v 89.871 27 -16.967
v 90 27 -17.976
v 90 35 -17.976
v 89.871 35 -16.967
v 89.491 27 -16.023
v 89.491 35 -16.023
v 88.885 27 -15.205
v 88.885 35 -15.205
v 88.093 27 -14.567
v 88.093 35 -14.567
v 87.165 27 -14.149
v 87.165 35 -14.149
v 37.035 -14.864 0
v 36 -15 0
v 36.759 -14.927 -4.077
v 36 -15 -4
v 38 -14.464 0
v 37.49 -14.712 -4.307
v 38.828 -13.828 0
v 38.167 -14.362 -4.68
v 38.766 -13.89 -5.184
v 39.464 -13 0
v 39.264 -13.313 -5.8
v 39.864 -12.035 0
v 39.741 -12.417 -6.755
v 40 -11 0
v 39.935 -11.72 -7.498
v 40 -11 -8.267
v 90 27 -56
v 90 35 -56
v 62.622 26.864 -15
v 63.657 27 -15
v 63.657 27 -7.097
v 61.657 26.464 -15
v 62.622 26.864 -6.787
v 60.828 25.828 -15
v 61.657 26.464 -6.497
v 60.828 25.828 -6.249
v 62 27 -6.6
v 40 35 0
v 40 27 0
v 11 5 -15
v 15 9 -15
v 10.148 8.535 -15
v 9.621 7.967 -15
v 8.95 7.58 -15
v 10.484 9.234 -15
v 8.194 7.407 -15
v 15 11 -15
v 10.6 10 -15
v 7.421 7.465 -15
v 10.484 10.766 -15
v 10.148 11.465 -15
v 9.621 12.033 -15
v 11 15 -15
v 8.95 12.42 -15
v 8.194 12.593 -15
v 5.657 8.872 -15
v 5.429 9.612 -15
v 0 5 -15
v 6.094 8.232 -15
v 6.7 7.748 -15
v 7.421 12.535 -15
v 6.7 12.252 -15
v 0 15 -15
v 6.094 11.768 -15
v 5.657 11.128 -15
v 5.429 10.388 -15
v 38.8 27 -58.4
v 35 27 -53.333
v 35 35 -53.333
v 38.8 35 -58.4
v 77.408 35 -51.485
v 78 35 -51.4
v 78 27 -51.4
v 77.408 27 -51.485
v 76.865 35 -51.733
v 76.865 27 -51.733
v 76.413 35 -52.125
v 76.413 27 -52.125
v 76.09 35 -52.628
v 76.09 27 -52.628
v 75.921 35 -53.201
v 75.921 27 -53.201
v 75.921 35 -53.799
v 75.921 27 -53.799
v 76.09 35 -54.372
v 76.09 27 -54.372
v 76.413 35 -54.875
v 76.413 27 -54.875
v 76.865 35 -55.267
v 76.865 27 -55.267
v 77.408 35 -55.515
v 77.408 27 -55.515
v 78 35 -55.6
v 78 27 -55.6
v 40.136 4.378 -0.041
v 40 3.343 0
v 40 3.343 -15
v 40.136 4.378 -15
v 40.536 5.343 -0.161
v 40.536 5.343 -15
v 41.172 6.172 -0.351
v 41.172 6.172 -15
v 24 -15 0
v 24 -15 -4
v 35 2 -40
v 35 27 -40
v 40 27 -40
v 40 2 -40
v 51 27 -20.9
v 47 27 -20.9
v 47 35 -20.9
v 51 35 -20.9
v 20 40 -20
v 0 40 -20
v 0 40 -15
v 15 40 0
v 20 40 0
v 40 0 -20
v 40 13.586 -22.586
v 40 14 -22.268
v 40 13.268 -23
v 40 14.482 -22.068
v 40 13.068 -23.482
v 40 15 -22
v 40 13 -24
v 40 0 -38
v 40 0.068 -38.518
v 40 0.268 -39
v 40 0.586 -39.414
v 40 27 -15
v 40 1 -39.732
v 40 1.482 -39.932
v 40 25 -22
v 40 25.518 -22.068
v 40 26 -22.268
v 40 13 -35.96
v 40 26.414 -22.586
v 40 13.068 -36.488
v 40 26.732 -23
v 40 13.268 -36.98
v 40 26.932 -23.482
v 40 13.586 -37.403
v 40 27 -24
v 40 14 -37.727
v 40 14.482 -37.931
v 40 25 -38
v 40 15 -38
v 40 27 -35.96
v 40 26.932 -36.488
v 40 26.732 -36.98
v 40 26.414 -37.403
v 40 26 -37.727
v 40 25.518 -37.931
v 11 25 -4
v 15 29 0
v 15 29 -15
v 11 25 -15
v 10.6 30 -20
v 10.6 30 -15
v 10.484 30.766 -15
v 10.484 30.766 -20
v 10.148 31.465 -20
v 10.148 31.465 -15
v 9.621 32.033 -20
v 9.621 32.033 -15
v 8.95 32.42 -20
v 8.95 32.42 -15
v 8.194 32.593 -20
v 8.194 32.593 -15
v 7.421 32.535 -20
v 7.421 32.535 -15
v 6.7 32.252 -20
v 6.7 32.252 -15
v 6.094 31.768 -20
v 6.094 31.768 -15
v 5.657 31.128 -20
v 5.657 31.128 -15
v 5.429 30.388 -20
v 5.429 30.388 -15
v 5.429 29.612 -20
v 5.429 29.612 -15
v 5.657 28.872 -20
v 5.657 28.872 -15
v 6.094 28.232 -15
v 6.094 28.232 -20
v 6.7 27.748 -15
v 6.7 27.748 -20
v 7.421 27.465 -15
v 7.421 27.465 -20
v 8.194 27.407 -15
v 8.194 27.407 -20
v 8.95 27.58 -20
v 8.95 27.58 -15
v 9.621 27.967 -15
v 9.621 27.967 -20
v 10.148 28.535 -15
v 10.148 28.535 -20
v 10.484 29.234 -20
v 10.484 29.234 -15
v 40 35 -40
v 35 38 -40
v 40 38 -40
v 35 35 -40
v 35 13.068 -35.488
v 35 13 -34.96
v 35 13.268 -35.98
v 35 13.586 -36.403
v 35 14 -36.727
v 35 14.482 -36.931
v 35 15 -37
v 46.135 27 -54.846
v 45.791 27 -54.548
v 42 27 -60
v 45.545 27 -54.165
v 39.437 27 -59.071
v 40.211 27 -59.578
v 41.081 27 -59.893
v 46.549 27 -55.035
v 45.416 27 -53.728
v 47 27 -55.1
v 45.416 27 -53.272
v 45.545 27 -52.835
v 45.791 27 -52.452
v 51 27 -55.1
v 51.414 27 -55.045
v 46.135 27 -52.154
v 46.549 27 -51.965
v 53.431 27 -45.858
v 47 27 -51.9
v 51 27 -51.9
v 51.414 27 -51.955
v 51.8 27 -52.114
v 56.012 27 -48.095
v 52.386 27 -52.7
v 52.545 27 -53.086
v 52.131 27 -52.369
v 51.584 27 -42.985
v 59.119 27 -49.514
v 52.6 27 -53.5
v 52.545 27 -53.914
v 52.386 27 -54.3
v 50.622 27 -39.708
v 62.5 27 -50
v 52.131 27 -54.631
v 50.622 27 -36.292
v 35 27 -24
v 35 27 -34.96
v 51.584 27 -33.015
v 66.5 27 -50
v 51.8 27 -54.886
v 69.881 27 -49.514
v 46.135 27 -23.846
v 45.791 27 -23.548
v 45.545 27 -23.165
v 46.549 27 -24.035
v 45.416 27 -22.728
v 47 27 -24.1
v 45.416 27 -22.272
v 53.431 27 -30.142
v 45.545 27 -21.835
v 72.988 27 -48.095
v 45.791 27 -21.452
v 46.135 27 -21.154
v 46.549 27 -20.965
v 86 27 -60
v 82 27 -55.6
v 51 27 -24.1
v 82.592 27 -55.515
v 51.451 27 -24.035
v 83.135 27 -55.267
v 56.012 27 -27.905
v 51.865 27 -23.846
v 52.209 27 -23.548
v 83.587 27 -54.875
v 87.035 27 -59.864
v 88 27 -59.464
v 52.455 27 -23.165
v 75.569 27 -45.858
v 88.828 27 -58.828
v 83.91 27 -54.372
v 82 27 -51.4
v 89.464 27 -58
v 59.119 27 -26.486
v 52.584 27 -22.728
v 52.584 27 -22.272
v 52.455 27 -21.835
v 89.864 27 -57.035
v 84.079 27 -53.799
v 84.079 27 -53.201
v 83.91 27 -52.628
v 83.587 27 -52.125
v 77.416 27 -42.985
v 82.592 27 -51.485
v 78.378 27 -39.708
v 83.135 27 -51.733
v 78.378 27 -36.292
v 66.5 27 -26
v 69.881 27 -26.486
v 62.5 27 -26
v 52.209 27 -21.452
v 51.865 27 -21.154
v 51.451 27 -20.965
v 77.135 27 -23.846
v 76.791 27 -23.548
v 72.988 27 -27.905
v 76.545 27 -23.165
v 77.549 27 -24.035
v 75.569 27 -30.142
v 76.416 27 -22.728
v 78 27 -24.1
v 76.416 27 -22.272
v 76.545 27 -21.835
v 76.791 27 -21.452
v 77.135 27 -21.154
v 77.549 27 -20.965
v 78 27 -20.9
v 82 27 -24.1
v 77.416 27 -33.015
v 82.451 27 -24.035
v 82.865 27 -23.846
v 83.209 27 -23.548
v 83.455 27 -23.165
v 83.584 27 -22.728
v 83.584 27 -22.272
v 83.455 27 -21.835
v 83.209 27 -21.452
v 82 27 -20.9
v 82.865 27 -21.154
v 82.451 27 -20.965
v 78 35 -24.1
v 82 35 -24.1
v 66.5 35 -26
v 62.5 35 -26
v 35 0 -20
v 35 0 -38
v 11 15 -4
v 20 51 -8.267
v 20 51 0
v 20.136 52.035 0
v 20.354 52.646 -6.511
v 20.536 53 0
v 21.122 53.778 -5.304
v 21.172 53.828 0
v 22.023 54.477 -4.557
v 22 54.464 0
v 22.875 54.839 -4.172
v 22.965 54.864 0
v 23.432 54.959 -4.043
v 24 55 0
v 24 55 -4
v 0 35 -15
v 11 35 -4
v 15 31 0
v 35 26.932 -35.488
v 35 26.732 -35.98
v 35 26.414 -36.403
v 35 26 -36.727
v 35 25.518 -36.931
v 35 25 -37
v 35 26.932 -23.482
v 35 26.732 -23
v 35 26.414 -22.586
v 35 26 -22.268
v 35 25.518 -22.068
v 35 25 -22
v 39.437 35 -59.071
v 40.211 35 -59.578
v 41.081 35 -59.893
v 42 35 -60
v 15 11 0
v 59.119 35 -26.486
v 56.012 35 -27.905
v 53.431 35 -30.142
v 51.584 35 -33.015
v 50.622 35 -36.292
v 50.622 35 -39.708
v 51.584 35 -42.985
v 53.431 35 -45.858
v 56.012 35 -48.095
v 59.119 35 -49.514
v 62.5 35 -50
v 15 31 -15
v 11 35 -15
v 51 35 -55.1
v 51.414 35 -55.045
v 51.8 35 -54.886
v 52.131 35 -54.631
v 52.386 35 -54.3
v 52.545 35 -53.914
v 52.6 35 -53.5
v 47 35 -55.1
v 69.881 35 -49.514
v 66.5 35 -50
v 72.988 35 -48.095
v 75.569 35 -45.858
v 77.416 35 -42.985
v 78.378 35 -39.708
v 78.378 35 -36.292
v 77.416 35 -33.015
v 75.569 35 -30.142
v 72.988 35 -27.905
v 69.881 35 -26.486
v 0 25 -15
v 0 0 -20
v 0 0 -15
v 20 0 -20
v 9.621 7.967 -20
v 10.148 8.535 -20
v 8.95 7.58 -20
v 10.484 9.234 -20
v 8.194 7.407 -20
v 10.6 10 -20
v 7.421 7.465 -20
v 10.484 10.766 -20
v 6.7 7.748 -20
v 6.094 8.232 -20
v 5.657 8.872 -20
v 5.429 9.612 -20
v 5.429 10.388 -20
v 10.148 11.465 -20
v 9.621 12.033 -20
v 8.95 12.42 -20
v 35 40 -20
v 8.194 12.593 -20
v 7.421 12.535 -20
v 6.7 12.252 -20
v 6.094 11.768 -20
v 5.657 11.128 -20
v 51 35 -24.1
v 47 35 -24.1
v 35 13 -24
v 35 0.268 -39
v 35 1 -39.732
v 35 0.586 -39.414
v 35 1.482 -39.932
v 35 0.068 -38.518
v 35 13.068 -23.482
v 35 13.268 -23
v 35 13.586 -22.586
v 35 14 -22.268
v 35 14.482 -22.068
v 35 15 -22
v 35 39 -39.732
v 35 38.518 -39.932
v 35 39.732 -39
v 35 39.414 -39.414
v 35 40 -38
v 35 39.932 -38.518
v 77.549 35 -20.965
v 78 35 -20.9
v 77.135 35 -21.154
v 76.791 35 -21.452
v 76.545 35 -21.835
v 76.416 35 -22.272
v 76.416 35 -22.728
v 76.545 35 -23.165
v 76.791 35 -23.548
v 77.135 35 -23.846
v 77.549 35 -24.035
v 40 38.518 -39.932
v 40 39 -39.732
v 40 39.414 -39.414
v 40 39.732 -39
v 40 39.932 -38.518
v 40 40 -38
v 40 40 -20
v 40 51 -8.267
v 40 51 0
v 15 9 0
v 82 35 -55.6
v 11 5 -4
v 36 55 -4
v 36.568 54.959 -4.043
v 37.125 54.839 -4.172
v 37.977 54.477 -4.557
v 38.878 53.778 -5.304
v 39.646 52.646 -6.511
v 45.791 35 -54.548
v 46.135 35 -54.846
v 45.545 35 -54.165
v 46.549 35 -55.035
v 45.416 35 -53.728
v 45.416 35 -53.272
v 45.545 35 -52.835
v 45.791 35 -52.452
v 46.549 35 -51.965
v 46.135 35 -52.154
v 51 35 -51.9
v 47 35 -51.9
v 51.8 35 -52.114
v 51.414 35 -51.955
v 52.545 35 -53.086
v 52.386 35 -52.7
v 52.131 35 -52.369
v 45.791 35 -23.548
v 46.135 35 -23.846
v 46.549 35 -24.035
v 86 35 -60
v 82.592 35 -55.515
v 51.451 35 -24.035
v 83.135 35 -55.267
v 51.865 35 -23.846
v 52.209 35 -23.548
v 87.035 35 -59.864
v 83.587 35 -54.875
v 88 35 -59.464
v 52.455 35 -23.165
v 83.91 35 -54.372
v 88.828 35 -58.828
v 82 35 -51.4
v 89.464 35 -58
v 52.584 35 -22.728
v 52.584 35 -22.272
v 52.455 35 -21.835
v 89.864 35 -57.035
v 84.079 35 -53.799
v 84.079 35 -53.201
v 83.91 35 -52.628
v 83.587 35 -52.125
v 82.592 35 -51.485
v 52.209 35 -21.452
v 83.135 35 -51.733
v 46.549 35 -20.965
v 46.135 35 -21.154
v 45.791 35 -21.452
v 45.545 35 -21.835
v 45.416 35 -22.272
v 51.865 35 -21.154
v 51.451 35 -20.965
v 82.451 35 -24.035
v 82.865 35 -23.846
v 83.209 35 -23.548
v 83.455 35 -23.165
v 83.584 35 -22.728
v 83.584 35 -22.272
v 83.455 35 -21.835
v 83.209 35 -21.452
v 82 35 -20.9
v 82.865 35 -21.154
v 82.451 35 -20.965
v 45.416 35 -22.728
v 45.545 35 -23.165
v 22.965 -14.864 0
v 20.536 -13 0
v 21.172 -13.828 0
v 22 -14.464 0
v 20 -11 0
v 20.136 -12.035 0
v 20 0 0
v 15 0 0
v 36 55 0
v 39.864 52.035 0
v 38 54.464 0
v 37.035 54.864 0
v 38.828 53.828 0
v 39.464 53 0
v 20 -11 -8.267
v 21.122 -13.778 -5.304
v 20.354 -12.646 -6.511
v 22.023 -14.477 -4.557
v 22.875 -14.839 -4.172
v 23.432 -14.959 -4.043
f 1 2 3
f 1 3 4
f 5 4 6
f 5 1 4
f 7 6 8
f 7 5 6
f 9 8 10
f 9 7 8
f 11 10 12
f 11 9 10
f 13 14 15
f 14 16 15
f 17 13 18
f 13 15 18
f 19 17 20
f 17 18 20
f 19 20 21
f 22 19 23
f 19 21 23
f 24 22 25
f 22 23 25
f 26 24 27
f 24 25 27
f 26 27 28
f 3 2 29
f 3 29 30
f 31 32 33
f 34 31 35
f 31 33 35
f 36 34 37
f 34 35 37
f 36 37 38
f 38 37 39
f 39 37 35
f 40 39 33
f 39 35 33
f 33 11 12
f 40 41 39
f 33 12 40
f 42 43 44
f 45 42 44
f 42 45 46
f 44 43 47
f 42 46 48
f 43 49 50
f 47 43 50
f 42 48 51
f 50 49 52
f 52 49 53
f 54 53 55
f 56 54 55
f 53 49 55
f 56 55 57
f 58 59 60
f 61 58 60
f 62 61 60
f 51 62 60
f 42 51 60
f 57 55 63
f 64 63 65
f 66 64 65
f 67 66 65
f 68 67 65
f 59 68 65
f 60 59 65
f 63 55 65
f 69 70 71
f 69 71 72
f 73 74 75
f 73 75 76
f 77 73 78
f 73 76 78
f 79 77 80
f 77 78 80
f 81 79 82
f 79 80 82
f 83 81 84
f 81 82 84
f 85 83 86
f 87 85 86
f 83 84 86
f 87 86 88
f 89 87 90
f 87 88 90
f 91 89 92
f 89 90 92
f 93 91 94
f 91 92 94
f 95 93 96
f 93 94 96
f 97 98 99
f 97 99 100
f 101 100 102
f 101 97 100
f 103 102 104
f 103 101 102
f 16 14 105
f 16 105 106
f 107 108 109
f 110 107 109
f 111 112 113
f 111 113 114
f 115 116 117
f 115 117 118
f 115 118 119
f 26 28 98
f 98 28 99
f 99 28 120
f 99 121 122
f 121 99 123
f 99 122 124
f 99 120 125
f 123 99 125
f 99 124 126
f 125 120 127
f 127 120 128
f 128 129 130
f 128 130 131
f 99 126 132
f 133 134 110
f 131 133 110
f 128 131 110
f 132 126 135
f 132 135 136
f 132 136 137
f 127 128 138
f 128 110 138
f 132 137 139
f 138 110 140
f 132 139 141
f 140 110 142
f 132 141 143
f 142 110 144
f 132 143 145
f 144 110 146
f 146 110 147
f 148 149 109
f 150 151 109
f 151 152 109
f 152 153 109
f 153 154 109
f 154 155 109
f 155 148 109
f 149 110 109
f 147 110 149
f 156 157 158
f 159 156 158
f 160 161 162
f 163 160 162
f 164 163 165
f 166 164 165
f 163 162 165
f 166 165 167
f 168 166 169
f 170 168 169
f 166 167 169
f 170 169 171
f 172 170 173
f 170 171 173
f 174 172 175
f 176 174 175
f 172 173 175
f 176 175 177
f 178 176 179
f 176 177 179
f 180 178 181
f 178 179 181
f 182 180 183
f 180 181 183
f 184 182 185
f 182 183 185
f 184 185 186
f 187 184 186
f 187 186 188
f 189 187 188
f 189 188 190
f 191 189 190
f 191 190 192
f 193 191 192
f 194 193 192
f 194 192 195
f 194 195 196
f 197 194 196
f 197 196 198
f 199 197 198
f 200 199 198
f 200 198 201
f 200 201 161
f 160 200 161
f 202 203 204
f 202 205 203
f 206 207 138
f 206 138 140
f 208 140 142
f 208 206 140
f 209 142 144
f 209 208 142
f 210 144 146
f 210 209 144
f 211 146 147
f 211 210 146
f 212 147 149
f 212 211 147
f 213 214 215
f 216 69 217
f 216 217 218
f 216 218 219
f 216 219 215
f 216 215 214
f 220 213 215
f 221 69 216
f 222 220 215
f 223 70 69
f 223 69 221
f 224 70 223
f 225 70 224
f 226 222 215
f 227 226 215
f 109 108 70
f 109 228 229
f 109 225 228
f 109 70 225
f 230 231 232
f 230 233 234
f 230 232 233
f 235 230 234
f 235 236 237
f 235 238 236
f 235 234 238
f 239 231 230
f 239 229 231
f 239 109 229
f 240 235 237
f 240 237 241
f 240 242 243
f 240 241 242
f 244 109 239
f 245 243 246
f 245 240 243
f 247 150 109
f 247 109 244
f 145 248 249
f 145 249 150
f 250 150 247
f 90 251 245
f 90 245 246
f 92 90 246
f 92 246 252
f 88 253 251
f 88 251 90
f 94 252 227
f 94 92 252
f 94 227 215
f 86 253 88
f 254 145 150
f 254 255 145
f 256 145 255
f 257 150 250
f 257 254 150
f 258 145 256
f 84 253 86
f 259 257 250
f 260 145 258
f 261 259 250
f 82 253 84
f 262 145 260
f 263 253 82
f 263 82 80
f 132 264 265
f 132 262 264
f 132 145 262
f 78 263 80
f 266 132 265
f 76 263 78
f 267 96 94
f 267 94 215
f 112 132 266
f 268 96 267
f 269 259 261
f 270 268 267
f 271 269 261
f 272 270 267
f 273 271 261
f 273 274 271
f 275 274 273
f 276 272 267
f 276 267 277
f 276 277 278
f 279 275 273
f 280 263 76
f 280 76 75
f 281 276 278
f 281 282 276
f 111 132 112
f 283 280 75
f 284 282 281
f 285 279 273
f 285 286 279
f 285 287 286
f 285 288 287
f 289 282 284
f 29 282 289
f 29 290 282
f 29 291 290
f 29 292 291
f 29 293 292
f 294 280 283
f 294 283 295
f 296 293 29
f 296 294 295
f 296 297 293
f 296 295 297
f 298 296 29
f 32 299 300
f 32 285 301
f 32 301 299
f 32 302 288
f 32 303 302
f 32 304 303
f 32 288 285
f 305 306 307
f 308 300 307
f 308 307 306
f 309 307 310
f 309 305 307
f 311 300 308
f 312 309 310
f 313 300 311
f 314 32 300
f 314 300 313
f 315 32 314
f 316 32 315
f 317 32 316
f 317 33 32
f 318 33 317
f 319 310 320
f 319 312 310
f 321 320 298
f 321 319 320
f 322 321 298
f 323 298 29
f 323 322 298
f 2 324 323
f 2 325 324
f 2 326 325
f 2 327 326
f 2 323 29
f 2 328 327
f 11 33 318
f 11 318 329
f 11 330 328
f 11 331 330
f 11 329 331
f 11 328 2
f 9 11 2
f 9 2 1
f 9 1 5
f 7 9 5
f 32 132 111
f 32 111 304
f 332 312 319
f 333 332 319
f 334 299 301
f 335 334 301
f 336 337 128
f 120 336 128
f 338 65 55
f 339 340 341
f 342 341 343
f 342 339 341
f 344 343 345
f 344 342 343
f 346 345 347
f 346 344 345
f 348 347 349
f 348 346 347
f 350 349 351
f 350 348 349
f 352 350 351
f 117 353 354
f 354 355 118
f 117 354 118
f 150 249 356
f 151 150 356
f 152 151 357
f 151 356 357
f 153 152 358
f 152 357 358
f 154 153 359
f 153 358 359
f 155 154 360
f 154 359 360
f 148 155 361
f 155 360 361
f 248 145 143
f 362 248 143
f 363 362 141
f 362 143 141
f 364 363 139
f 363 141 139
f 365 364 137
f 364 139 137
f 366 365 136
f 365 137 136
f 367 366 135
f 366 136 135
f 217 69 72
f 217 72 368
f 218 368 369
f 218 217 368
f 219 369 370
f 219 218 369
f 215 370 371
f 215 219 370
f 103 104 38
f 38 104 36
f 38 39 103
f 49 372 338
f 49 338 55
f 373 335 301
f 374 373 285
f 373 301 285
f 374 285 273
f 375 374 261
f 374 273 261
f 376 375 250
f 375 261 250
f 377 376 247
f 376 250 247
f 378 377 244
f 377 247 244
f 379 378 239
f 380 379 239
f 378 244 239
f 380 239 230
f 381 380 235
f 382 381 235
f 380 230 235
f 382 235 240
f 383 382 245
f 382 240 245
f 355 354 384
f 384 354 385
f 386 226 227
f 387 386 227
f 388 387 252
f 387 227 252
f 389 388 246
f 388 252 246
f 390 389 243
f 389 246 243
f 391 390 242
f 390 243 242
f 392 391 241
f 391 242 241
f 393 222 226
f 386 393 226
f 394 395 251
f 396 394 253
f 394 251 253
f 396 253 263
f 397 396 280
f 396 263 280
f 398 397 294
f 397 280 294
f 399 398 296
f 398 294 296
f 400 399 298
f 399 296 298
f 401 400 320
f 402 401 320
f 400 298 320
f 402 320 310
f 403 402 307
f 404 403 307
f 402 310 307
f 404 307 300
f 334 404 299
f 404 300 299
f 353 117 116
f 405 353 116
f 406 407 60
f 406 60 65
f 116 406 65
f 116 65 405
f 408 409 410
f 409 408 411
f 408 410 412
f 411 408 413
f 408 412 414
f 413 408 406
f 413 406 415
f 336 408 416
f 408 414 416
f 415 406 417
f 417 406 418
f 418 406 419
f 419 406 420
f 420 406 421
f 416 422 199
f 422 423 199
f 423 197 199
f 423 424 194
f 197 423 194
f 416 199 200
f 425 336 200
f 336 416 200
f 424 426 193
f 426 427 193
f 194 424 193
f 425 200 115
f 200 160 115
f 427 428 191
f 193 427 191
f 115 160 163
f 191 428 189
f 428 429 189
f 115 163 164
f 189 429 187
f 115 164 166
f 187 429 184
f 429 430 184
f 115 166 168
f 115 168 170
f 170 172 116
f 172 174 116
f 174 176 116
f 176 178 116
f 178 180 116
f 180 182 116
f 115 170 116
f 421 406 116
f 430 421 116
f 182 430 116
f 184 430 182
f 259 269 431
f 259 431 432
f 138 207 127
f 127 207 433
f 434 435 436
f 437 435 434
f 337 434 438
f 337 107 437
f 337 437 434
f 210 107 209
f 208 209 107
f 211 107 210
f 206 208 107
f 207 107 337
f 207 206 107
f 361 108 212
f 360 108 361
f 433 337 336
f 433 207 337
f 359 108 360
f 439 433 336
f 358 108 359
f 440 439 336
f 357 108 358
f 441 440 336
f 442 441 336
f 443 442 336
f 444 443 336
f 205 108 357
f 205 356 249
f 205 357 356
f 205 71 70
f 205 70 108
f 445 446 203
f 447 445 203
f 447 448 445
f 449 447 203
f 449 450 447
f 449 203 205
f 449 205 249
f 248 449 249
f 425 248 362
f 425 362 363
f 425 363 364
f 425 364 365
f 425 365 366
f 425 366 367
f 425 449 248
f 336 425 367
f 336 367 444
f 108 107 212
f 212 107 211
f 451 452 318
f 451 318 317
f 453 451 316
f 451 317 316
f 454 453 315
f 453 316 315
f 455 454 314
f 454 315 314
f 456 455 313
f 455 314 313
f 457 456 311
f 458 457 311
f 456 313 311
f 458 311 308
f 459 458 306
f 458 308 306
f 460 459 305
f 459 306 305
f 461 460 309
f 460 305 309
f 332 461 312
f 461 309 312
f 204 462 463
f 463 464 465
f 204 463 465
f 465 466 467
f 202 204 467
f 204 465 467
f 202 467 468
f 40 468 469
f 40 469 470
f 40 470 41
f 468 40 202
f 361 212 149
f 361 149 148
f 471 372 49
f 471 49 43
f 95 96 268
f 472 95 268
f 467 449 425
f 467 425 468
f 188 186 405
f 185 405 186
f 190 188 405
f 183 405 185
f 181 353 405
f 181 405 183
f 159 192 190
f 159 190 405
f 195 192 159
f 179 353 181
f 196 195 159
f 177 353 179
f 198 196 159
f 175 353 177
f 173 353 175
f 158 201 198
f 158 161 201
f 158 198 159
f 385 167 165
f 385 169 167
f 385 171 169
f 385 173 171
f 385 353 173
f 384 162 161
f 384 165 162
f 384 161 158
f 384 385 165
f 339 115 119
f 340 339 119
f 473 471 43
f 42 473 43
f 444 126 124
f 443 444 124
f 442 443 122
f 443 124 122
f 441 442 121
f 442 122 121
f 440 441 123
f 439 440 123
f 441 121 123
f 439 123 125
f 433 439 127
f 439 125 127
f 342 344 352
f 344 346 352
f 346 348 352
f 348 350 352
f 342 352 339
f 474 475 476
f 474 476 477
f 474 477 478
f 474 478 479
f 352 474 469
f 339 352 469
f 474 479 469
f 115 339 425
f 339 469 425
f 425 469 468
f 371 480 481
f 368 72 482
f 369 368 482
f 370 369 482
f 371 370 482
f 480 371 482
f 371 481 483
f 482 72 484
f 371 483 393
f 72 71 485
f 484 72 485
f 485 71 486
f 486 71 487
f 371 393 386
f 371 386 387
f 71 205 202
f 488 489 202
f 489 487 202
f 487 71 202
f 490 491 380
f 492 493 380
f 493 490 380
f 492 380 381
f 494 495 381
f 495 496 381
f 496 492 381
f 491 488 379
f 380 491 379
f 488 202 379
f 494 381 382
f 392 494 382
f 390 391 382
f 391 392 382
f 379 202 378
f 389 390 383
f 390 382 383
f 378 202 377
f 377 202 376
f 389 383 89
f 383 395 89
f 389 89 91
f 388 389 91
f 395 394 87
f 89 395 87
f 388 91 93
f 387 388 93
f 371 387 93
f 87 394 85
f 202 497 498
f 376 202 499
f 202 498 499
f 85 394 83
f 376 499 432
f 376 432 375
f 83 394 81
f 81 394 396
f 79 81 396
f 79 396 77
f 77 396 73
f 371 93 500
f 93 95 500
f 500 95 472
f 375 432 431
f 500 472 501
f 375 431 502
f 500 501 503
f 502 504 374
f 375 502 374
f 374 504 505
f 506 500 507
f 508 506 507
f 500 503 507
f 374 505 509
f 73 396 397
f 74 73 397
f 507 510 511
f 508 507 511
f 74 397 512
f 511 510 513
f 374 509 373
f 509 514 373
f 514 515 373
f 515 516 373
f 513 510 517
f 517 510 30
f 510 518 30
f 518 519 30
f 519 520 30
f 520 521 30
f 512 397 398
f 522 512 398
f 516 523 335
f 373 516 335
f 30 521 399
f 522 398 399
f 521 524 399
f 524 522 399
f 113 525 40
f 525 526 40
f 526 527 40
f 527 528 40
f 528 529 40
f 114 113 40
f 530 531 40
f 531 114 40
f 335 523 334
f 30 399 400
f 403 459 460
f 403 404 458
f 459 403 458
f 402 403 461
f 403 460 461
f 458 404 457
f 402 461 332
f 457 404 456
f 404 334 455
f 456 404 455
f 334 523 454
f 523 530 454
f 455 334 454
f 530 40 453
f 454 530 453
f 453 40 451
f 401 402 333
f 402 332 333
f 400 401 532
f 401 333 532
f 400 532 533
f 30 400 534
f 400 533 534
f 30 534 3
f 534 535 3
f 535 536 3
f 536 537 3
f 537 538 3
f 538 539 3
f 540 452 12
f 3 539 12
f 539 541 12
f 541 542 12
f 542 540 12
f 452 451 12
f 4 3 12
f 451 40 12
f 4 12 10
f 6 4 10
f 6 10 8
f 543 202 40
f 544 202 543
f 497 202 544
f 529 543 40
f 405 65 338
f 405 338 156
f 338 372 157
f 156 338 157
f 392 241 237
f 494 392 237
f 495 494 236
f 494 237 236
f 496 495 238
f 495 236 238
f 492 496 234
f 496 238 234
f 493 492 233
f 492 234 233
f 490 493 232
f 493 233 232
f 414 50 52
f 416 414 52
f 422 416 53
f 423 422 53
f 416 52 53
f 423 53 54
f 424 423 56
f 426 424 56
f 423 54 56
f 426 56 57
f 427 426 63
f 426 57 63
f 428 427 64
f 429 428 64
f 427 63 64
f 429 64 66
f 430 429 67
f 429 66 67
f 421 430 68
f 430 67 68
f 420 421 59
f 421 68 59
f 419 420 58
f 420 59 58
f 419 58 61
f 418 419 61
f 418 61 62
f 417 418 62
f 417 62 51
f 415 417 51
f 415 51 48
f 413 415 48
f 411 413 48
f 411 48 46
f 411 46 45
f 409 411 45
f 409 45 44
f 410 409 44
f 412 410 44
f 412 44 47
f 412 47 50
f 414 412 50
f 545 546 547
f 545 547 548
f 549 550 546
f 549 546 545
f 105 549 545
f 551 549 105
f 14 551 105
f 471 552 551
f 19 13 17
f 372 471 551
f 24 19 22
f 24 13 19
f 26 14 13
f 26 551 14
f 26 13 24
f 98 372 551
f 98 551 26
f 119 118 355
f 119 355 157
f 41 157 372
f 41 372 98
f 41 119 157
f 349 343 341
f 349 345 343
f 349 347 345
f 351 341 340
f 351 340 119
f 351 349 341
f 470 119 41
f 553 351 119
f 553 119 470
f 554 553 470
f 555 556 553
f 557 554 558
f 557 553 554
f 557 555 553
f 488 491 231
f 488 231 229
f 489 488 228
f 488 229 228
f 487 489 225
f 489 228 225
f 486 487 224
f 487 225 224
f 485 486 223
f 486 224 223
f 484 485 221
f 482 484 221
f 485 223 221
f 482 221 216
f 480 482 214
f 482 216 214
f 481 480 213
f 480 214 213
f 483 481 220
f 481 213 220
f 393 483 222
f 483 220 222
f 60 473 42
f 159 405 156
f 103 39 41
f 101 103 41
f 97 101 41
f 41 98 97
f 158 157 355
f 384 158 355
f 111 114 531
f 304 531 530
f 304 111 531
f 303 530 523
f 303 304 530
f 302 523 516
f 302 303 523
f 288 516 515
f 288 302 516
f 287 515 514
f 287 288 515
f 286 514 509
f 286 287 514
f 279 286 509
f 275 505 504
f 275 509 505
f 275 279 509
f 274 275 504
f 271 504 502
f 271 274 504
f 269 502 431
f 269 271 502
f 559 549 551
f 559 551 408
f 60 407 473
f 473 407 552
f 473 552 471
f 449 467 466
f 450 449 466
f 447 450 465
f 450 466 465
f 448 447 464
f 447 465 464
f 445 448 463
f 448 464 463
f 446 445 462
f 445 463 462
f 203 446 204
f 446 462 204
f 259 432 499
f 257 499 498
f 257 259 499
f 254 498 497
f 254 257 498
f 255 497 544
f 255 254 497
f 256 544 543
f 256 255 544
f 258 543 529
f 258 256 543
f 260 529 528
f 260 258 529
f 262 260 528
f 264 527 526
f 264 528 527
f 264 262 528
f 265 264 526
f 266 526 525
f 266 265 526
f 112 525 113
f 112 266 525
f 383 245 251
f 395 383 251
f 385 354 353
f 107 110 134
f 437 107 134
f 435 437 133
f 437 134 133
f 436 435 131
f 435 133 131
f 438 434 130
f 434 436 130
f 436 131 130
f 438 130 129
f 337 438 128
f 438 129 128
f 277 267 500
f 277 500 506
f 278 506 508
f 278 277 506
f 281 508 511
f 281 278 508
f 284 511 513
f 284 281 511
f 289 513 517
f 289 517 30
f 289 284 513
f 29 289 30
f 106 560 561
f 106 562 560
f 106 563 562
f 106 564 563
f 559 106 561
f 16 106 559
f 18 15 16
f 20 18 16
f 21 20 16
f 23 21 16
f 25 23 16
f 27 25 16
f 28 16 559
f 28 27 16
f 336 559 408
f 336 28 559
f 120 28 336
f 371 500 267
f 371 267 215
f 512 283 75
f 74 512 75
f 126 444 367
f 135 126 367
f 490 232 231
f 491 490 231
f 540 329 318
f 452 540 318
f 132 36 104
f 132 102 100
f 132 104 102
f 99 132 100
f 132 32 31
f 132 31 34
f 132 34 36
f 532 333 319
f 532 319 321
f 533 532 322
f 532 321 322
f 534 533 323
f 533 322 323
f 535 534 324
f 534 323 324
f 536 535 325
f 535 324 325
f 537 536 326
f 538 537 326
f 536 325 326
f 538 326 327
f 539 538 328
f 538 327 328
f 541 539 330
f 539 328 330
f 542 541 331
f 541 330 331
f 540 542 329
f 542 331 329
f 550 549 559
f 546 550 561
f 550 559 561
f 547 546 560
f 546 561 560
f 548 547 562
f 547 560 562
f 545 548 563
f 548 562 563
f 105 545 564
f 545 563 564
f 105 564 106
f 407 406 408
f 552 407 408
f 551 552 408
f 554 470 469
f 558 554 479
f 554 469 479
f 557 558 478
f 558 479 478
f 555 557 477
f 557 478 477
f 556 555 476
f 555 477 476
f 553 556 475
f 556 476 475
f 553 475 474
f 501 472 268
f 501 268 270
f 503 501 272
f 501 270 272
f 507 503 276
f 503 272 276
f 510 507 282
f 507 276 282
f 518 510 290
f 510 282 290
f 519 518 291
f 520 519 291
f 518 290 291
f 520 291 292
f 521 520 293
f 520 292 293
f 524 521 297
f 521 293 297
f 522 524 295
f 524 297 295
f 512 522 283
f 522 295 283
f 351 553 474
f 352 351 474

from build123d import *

# Parameters (mm, degrees)
SKETCH1_W                = 40
SKETCH1_H                = 40
BOSS_EXTRUDE1_DEPTH      = 40
SKETCH2_W                = 25
SKETCH2_H                = 20
CUT_EXTRUDE1_DEPTH       = 40
CHAMFER1_SIZE            = 15
CUT_EXTRUDE2_DEPTH       = 15
CHAMFER2_SIZE            = 4
SKETCH4_R                = 2.6
CUT_EXTRUDE3_DEPTH       = 17
BOSS_EXTRUDE3_DEPTH      = 20
FILLET3_R                = 4
BOSS_EXTRUDE2_DEPTH      = 20
BOSS_EXTRUDE2_DEPTH_BACK = 25
SKETCH5_W                = 50
SKETCH5_H                = 8
CUT_EXTRUDE4_DEPTH       = 10
CHAMFER3_SIZE            = 15
CHAMFER3_SIZE_2          = 20
CHAMFER4_SIZE2           = 50
CHAMFER4_SIZE            = 15
FILLET5_START            = 26
FILLET5_DEPTH            = 10
FILLET6_R                = 2
CHAMFER5_START           = -40
CHAMFER5_DEPTH           = 40
CHAMFER5_START_2         = 2
CHAMFER5_2_DEPTH         = 25
SKETCH11_W               = 27.237482008
SKETCH11_H               = 25
CUT_EXTRUDE5_DEPTH       = 25
FILLET7_R                = 4
SKETCH16_W               = 14
SKETCH16_H               = 14
CUT_EXTRUDE6_DEPTH       = 43
CHAMFER6_SIZE            = 2
CHAMFER6_SIZE2           = 10
FILLET9_R                = 2
CUT_EXTRUDE7_DEPTH       = 10


with BuildPart() as part:
    # Sketch1 → Boss-Extrude1 (new body)
    with BuildSketch(Plane(origin=(0, 0, 0), x_dir=(1, 0, 0), z_dir=(0, 1, 0))):
        with Locations((20, 20)):
            Rectangle(SKETCH1_W, SKETCH1_H)
    extrude(amount=BOSS_EXTRUDE1_DEPTH)

    # Sketch2 → Cut-Extrude1 (cut)
    with BuildSketch(Plane(origin=(0, 40, 0), x_dir=(1, 0, 0), z_dir=(0, 1, 0))):
        with Locations((12.5, 30)):
            Rectangle(SKETCH2_W, SKETCH2_H)
    extrude(amount=-CUT_EXTRUDE1_DEPTH, mode=Mode.SUBTRACT)

    # Chamfer1
    chamfer1_edges = [part.edges().sort_by_distance(p)[0] for p in [
        (0, 20, 0),
    ]]
    chamfer(chamfer1_edges, length=CHAMFER1_SIZE)

    # Sketch3 → Cut-Extrude2 (cut)
    with BuildSketch(Plane.XY):
        Polygon((0, 10), (0, 15), (15, 15), (15, 5), (0, 5), align=None)
        Polygon((0, 30), (0, 25), (15, 25), (15, 35), (0, 35), align=None)
    extrude(amount=-CUT_EXTRUDE2_DEPTH, mode=Mode.SUBTRACT)

    # Chamfer2
    chamfer2_edges = [part.edges().sort_by_distance(p)[0] for p in [
        (15, 35, -7.5),
        (15, 25, -7.5),
        (15, 15, -7.5),
        (15, 5, -7.5),
    ]]
    chamfer(chamfer2_edges, length=CHAMFER2_SIZE)

    # Sketch4 → Cut-Extrude3 (cut)
    with BuildSketch(Plane.XY.offset(-15)):
        with Locations((8, 30)):
            Circle(SKETCH4_R)
        with Locations((8, 10)):
            Circle(SKETCH4_R)
    extrude(amount=-CUT_EXTRUDE3_DEPTH, mode=Mode.SUBTRACT)

    # Sketch9 → Boss-Extrude3 (add)
    with BuildSketch(Plane(origin=(40, 0, 0), x_dir=(0, 0, -1), z_dir=(1, 0, 0))):
        Polygon((0, 40), (0, 55), (4, 55), (20, 40), align=None)
        Polygon((0, 0), (0, -15), (4, -15), (20, 0), align=None)
    extrude(amount=-BOSS_EXTRUDE3_DEPTH)

    # Fillet3
    fillet3_edges = [part.edges().sort_by_distance(p)[0] for p in [
        (20, 55, -2),
        (40, 55, -2),
        (20, -15, -2),
        (40, -15, -2),
    ]]
    fillet(fillet3_edges, radius=FILLET3_R)

    # Sketch5 → Boss-Extrude2 (add, two sides: drawn at the far end of the back side and taken through both)
    with BuildSketch(Plane(origin=(0, 0, -40), x_dir=(-1, 0, 0), z_dir=(0, 0, -1)).offset(-BOSS_EXTRUDE2_DEPTH_BACK)):
        with Locations((-65, 31)):
            Rectangle(SKETCH5_W, SKETCH5_H)
    extrude(amount=BOSS_EXTRUDE2_DEPTH + BOSS_EXTRUDE2_DEPTH_BACK)

    # Sketch10 → Cut-Extrude4 (cut)
    with BuildSketch(Plane(origin=(0, 27, 0), x_dir=(-1, 0, 0), z_dir=(0, -1, 0))):
        with BuildLine():
            ThreePointArc((-47, 51.9), (-45.4, 53.5), (-47, 55.1))
            Line((-47, 55.1), (-51, 55.1))
            ThreePointArc((-51, 55.1), (-52.13137085, 54.63137085), (-52.6, 53.5))
            ThreePointArc((-52.6, 53.5), (-52.13137085, 52.36862915), (-51, 51.9))
            Line((-51, 51.9), (-47, 51.9))
        make_face()
        with BuildLine():
            ThreePointArc((-47, 20.9), (-45.4, 22.5), (-47, 24.1))
            Line((-47, 24.1), (-51, 24.1))
            ThreePointArc((-51, 24.1), (-52.6, 22.5), (-51, 20.9))
            Line((-51, 20.9), (-47, 20.9))
        make_face()
        with BuildLine():
            ThreePointArc((-78, 20.9), (-76.4, 22.5), (-78, 24.1))
            Line((-78, 24.1), (-82, 24.1))
            ThreePointArc((-82, 24.1), (-83.6, 22.5), (-82, 20.9))
            Line((-82, 20.9), (-78, 20.9))
        make_face()
        with BuildLine():
            ThreePointArc((-66.5, 50), (-78.5, 38), (-66.5, 26))
            Line((-66.5, 26), (-62.5, 26))
            ThreePointArc((-62.5, 26), (-50.5, 38), (-62.5, 50))
            Line((-62.5, 50), (-66.5, 50))
        make_face()
        with BuildLine():
            ThreePointArc((-78, 51.4), (-75.9, 53.5), (-78, 55.6))
            Line((-78, 55.6), (-82, 55.6))
            ThreePointArc((-82, 55.6), (-84.1, 53.5), (-82, 51.4))
            Line((-82, 51.4), (-78, 51.4))
        make_face()
    extrude(amount=-CUT_EXTRUDE4_DEPTH, mode=Mode.SUBTRACT)

    # Chamfer3
    # the kernel refuses this chamfer: 20, 15 mm, written as the material it adds along each edge
    with BuildSketch(Plane(origin=(40, 27, -40), x_dir=(-1, 0, 0), z_dir=(0, 1, 0))) as chamfer3_piece_1:
        Polygon((CHAMFER3_SIZE, 0), (0, -CHAMFER3_SIZE_2), (0, 0), align=None)
    extrude(amount=8)

    # Chamfer4
    chamfer4_edges = [part.edges().sort_by_distance(p)[0] for p in [
        (40, 31, -15),
    ]]
    chamfer4_side = [part.faces().sort_by_distance(p)[0] for p in [
        (40, 31, -14.7),
    ]]
    chamfer(chamfer4_edges, length=CHAMFER4_SIZE - 0.0001, length2=CHAMFER4_SIZE2 - 0.0001, reference=chamfer4_side[0])  # a hair under: the kernel refuses the full size

    # Fillet5: read off the stored shape, not the designer's step
    # Fillet5 outline → Fillet5 (cut)
    with BuildSketch(Plane(origin=(0, 0, 0), x_dir=(1, 0, 0), z_dir=(0, 1, 0)).offset(FILLET5_START)):
        with BuildLine():
            Line((90, 15), (90, 17.976122604))
            ThreePointArc((90, 17.976122604), (89.209171713, 15.588400485), (87.149391542, 14.144817463))
            Line((87.149391542, 14.144817463), (90, 15))
        make_face()
        with BuildLine():
            ThreePointArc((38.8, 58.4), (40.211145618, 59.577708764), (42, 60))
            Line((42, 60), (40, 60))
            Line((40, 60), (38.8, 58.4))
        make_face()
        with BuildLine():
            ThreePointArc((86, 60), (88.828427125, 58.828427125), (90, 56))
            Line((90, 56), (90, 60))
            Line((90, 60), (86, 60))
        make_face()
    extrude(amount=FILLET5_DEPTH, mode=Mode.SUBTRACT)

    # Fillet6
    fillet6_edges = [part.edges().sort_by_distance(p)[0] for p in [
        (32.5, 40, -40),
        (32.5, 0, -40),
    ]]
    fillet(fillet6_edges, radius=FILLET6_R)

    # Chamfer5: read off the stored shape, not the designer's step
    # Chamfer5 outline → Chamfer5 (add)
    with BuildSketch(Plane.XY.offset(CHAMFER5_START)):
        Polygon((40, 5), (62, 27), (40, 27), align=None)
    extrude(amount=CHAMFER5_DEPTH)

    # Chamfer5 2 outline → Chamfer5 2 (cut)
    with BuildSketch(Plane(origin=(0, 0, 0), x_dir=(1, 0, 0), z_dir=(0, 1, 0)).offset(CHAMFER5_START_2)):
        with BuildLine():
            Line((51, 24.1), (47, 24.1))
            ThreePointArc((47, 24.1), (45.4, 22.5), (47, 20.9))
            Line((47, 20.9), (51, 20.9))
            ThreePointArc((51, 20.9), (52.6, 22.5), (51, 24.1))
        make_face()
        with BuildLine():
            ThreePointArc((50.667840434, 40), (53.33484861, 30.254033308), (62.5, 26))
            Line((62.5, 26), (64, 26))
            Line((64, 26), (64, 40))
            Line((64, 40), (50.667840434, 40))
        make_face()
        Polygon((64, 0), (64, 7.2), (40, 0), align=None)
    extrude(amount=CHAMFER5_2_DEPTH, mode=Mode.SUBTRACT)

    # Sketch11 → Cut-Extrude5 (cut)
    with BuildSketch(Plane(origin=(0, 0, -40), x_dir=(-1, 0, 0), z_dir=(0, 0, -1))):
        with Locations((-53.618741004, 14.5)):
            Rectangle(SKETCH11_W, SKETCH11_H)
    extrude(amount=-CUT_EXTRUDE5_DEPTH, mode=Mode.SUBTRACT)

    # Fillet7
    fillet7_edges = [part.edges().sort_by_distance(p)[0] for p in [
        (62, 27, -10.8000346),
        (40, 5, -7.5),
    ]]
    fillet(fillet7_edges, radius=FILLET7_R)

    # Sketch16 → Cut-Extrude6 (cut)
    with BuildSketch(Plane.ZY):
        with Locations((-29, 20)):
            Rectangle(SKETCH16_W, SKETCH16_H)
    extrude(amount=-CUT_EXTRUDE6_DEPTH, mode=Mode.SUBTRACT)

    # Chamfer6
    chamfer6_edges = [part.edges().sort_by_distance(p)[0] for p in [
        (40, 20, -36),
    ]]
    chamfer6_side = [part.faces().sort_by_distance(p)[0] for p in [
        (40, 6.638609855, -21.034394019),
    ]]
    chamfer(chamfer6_edges, length=CHAMFER6_SIZE, length2=CHAMFER6_SIZE2, reference=chamfer6_side[0])

    # Fillet9
    fillet9_edges = [part.edges().sort_by_distance(p)[0] for p in [
        (32.5, 13, -22),
        (32.5, 27, -22),
        (27.5, 27, -36),
        (27.5, 13, -36),
        (35, 13, -37),
        (35, 27, -37),
    ]]
    fillet(fillet9_edges, radius=FILLET9_R)

    # Sketch17 → Cut-Extrude7 (cut)
    with BuildSketch(Plane.ZY.offset(-25)):
        Polygon((-20, 0), (-20, 45.439025914), (-90.041383554, 45.439025914), (-90.041383554, -69.890024076), align=None)
    extrude(amount=-CUT_EXTRUDE7_DEPTH, mode=Mode.SUBTRACT)


solid = part.part
